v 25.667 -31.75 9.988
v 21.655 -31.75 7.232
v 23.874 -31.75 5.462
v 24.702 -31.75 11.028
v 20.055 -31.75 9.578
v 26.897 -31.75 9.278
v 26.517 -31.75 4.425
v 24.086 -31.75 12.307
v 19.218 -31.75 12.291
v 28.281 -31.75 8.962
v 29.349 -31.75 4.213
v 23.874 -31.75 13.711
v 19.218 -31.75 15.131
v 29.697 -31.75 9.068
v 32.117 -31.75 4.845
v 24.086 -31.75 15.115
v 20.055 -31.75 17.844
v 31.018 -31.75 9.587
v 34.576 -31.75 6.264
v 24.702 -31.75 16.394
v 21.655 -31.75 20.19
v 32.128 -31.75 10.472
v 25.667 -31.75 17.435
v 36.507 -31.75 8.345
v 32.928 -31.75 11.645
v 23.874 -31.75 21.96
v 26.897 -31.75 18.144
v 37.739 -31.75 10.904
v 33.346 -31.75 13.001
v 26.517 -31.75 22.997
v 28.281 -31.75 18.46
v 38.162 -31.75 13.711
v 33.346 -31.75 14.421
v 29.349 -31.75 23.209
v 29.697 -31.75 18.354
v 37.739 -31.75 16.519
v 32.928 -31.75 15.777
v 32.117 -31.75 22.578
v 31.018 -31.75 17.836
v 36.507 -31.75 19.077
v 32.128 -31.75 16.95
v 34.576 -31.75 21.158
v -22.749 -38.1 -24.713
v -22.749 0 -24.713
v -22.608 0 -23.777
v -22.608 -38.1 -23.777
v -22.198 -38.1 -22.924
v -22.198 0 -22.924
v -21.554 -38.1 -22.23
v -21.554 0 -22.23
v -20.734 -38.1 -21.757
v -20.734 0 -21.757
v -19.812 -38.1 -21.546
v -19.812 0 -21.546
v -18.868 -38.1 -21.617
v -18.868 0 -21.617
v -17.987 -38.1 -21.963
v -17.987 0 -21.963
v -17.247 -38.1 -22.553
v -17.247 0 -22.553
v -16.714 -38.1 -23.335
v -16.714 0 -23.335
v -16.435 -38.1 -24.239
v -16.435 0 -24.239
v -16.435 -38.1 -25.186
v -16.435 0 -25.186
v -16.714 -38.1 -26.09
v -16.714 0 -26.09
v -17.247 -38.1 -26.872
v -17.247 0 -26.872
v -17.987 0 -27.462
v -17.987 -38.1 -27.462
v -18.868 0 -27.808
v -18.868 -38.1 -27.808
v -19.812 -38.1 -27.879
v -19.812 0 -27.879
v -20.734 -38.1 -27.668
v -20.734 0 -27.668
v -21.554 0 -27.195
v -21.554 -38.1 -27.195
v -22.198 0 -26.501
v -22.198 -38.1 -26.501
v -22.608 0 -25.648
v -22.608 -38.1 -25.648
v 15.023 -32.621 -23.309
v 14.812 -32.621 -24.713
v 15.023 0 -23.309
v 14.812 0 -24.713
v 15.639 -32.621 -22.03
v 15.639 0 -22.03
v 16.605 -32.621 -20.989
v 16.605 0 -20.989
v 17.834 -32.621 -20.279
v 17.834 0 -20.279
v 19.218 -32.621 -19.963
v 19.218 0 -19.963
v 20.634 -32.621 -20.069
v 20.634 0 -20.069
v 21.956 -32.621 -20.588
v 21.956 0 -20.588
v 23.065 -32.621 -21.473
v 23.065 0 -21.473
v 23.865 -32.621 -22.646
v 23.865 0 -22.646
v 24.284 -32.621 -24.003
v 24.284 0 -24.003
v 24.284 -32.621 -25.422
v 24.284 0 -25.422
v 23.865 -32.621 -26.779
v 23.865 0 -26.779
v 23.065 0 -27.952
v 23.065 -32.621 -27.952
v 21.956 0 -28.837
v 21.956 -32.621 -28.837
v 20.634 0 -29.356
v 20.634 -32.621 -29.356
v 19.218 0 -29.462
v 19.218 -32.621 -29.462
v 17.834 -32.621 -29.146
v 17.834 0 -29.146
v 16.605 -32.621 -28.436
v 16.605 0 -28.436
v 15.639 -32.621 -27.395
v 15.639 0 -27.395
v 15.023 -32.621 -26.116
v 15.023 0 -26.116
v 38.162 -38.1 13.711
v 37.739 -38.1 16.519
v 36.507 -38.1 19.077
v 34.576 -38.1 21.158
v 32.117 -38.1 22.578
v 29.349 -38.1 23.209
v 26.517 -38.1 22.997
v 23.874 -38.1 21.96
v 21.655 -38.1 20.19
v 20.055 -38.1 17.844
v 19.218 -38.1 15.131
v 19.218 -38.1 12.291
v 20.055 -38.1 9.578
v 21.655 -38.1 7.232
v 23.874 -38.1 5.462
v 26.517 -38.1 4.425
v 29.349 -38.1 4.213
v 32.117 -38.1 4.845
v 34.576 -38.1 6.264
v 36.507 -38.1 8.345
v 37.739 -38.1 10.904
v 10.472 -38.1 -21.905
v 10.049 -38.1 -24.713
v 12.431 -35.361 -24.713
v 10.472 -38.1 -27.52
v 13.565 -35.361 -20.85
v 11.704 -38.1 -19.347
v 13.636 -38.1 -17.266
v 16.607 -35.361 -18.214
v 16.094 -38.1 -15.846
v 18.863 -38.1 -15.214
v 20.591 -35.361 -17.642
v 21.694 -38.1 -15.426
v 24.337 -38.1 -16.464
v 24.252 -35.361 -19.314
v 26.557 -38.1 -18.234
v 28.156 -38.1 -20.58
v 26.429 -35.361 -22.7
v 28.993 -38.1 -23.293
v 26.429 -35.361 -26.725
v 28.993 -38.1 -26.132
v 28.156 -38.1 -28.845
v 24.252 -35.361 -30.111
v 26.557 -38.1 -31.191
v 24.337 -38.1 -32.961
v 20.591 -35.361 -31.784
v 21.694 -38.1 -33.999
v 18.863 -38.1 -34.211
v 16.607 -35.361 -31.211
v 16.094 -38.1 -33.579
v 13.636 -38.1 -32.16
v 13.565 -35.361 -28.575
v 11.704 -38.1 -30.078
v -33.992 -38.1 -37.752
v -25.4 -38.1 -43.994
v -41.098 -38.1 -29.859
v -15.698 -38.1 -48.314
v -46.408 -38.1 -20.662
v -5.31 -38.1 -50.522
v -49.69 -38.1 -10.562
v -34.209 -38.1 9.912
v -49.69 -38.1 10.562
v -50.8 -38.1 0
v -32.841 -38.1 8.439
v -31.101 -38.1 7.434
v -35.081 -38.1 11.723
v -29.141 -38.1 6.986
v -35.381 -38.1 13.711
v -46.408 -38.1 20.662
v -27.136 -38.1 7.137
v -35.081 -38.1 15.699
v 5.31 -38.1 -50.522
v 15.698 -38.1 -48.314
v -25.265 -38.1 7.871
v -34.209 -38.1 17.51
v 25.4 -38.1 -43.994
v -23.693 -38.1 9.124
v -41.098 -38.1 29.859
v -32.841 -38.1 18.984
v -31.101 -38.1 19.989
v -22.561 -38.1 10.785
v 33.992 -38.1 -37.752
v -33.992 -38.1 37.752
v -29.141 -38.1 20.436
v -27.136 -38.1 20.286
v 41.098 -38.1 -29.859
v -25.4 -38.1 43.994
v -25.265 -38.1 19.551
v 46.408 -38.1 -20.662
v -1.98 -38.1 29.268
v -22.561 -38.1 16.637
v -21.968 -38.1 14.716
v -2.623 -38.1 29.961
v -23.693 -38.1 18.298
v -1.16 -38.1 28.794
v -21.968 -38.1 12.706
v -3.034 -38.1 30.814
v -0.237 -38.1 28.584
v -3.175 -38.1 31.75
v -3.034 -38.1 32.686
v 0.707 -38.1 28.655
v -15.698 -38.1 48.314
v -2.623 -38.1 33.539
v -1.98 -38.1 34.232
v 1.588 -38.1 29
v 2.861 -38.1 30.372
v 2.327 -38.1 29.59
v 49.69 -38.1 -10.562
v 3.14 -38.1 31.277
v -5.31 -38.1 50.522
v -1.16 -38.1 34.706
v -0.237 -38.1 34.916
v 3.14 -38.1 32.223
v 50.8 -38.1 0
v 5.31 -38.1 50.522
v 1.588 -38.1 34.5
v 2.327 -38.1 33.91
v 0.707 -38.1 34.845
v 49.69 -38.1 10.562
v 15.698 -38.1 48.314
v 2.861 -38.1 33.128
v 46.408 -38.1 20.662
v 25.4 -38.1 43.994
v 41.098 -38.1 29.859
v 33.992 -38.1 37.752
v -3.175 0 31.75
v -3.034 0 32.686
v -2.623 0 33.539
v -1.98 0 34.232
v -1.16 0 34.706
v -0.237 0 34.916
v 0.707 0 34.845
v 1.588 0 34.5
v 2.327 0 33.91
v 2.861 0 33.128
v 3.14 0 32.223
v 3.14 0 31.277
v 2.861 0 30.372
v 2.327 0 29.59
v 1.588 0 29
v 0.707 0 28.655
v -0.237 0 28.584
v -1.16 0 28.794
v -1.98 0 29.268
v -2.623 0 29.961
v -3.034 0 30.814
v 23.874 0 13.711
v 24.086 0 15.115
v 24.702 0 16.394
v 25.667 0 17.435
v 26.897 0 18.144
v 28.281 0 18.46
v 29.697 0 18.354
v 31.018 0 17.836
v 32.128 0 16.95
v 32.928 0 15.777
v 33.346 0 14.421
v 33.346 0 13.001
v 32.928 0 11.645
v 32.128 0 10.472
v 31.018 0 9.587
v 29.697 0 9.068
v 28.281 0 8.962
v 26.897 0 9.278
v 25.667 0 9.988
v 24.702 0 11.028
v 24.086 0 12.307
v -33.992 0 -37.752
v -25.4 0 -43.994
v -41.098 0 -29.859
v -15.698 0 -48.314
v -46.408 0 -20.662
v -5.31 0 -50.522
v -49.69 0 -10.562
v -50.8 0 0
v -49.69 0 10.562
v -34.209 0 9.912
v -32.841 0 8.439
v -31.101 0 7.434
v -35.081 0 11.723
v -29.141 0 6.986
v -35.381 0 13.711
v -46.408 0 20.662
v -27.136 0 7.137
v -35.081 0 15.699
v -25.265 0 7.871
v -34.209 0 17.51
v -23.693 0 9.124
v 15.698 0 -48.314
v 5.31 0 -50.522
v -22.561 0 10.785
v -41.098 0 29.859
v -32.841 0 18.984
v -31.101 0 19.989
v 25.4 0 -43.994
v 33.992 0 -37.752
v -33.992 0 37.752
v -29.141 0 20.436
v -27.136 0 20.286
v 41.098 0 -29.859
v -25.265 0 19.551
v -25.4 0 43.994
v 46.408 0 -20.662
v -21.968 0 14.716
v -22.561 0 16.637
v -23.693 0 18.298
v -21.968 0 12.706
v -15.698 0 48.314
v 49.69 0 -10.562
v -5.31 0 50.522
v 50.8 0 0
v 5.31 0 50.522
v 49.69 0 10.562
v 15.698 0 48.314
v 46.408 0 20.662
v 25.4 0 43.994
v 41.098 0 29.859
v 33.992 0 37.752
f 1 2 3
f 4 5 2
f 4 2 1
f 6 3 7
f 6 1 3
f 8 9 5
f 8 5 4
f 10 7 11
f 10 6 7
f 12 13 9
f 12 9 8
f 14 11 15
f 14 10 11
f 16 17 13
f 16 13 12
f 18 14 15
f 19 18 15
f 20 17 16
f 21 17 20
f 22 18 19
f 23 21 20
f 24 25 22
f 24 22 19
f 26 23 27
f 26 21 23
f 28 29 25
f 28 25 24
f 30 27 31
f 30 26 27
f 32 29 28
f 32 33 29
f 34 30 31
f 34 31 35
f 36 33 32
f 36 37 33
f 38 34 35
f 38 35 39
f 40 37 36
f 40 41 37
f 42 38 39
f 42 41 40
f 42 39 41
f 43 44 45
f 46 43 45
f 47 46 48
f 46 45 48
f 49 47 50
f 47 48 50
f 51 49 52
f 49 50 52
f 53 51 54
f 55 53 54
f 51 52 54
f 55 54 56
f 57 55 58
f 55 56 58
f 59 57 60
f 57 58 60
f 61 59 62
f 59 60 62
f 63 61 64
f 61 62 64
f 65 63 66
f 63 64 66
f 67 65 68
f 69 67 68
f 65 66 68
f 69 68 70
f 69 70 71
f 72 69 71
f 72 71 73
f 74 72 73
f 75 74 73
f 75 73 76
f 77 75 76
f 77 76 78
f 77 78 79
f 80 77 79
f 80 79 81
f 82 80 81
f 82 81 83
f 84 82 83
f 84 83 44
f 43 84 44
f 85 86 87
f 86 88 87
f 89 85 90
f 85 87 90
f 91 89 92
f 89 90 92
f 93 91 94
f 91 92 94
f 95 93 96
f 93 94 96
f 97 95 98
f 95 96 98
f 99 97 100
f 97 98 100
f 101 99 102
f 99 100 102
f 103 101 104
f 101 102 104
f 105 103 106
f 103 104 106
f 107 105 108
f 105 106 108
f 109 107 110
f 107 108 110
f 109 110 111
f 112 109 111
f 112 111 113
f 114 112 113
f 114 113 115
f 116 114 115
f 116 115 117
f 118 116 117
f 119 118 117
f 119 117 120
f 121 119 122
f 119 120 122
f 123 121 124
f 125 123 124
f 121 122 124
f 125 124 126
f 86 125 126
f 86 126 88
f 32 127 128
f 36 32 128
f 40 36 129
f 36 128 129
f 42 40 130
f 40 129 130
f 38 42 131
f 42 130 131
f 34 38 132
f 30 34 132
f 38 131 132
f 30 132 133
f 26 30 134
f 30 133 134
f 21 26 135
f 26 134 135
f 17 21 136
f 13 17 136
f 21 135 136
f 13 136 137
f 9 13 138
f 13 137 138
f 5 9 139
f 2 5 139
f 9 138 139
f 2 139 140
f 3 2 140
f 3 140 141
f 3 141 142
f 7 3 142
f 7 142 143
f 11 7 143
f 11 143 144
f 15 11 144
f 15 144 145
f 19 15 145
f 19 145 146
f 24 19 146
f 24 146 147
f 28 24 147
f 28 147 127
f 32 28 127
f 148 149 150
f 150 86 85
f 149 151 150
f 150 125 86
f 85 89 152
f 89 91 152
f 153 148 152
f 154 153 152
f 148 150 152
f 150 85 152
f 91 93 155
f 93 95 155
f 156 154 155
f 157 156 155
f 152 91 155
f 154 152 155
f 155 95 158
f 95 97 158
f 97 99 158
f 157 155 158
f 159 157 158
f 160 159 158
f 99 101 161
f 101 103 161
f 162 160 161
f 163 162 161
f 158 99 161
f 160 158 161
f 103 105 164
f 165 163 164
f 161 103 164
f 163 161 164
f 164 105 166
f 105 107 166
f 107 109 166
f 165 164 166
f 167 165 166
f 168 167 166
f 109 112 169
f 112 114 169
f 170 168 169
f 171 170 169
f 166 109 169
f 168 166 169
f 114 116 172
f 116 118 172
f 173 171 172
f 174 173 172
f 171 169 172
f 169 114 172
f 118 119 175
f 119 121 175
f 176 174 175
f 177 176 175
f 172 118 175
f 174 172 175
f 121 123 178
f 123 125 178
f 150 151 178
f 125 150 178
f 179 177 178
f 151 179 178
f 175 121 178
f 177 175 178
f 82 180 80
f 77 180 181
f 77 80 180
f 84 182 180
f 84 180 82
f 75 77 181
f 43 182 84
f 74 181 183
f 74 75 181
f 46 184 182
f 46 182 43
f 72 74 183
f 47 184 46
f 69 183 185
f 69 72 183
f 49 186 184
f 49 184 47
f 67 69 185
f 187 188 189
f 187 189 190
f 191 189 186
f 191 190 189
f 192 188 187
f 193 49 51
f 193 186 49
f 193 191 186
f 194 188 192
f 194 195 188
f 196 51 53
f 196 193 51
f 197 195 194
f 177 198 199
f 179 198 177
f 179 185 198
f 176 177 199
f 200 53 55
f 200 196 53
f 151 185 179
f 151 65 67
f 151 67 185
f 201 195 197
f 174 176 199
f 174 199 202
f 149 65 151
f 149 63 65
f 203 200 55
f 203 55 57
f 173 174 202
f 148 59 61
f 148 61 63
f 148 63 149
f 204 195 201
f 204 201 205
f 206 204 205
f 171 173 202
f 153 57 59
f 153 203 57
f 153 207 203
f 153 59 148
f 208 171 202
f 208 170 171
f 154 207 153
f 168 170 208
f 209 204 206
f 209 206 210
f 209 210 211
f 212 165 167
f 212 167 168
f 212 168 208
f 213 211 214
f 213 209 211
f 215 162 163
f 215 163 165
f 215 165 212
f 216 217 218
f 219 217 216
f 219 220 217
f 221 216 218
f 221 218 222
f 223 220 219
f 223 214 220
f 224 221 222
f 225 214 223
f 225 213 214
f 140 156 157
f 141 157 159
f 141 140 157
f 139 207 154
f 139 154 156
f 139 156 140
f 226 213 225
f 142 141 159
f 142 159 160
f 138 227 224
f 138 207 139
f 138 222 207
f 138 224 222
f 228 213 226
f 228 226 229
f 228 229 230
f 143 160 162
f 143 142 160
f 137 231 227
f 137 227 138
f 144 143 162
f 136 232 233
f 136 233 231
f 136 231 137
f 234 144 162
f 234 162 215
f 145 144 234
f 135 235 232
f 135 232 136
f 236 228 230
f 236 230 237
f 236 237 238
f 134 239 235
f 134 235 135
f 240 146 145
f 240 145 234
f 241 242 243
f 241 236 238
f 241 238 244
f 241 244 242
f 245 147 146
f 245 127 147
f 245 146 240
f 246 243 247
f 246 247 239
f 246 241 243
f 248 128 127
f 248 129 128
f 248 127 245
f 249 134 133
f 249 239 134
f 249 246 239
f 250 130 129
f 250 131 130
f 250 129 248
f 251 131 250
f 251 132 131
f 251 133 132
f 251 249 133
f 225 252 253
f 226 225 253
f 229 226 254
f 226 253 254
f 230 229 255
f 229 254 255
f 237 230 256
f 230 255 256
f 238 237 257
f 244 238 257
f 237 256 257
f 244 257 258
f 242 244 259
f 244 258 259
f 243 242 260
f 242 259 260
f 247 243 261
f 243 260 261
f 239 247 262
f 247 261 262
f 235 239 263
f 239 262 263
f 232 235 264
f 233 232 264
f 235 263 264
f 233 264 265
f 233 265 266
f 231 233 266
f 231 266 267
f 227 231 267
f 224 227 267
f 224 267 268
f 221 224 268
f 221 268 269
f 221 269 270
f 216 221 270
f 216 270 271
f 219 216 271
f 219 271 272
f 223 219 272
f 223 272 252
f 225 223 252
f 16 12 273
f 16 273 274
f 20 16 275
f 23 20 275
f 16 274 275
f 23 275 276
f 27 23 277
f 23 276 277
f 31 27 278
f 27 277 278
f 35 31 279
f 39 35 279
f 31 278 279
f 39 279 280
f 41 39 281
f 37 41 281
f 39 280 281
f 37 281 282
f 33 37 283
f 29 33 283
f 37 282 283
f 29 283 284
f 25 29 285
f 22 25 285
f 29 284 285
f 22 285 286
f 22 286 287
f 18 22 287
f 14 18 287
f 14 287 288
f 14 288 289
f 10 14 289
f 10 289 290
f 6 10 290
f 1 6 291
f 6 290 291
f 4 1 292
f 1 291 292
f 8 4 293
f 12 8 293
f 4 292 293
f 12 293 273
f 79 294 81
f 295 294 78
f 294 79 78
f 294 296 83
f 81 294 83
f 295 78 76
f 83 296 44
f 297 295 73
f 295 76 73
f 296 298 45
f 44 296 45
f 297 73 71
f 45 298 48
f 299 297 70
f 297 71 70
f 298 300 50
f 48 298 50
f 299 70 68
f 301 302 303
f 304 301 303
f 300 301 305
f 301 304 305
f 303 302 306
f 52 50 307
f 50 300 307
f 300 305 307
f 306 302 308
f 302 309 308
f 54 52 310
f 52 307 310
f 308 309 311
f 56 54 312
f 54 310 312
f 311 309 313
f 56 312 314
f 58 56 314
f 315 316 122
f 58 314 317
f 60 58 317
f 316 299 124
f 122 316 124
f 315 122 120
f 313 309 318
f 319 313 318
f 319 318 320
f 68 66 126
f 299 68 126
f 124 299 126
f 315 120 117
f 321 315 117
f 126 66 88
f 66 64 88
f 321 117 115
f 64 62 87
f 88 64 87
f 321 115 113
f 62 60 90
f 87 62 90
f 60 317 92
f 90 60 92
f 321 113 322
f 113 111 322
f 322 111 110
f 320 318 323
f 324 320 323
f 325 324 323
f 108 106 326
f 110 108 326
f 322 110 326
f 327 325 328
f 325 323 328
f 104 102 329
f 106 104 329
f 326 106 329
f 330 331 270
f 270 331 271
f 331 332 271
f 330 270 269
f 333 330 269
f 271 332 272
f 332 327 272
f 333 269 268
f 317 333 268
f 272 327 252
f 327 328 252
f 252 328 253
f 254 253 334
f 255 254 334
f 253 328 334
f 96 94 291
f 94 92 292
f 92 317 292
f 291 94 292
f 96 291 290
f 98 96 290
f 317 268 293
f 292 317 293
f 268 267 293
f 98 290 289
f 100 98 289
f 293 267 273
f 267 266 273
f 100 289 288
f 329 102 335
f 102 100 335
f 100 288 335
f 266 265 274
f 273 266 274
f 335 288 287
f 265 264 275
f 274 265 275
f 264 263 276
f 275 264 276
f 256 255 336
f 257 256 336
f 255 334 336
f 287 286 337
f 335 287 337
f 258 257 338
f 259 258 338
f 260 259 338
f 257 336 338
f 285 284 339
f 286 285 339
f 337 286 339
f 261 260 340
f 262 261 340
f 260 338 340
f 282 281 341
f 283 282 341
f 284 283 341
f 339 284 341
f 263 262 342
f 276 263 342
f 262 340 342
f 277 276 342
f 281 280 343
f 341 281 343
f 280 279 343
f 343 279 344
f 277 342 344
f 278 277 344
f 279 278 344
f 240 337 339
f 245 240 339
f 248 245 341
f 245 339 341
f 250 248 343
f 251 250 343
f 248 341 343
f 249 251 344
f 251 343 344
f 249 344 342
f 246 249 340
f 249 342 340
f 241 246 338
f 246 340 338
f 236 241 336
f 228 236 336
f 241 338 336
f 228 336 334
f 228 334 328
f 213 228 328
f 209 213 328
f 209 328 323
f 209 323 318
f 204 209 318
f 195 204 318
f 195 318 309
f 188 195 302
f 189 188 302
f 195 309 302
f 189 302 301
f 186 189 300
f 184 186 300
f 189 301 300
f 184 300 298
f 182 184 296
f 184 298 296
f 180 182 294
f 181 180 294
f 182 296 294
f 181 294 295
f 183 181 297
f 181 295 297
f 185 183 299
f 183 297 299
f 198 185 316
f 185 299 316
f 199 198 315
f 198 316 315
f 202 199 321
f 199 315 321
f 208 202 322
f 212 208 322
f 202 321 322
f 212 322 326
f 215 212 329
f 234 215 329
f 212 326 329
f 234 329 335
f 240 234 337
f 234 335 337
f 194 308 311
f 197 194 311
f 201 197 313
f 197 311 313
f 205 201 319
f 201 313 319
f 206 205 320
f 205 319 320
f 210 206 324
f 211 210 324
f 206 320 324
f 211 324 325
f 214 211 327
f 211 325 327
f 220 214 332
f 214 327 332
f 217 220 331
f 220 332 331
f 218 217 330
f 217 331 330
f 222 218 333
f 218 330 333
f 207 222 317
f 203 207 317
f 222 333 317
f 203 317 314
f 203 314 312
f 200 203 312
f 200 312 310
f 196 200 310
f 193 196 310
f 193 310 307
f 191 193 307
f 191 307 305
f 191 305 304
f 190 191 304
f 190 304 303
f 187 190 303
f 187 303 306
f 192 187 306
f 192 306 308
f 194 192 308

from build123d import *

# Parameters (mm, degrees)
F0_R           = 50.8
F1_DEPTH       = 38.1
F3_D           = 6.35
F4_D           = 9.525
F4_CBORE_D     = 19.05
F4_CBORE_DEPTH = 6.35
F5_D           = 9.525
F5_CSINK_D     = 19.05
F5_CSINK_ANGLE = 82
F6_D           = 6.35
F7_D           = 13.4874


with BuildPart() as f1:
    # F0 (on Front) → F1 (new body)
    with BuildSketch(Plane.XZ):
        Circle(F0_R)
        with BuildLine():
            ThreePointArc((0, 31.75), (22.45064, 22.45064), (31.75, 0))
            ThreePointArc((31.75, 0), (-22.45064, -22.45064), (0, 31.75))
        make_face(mode=Mode.SUBTRACT)
        with BuildLine():
            ThreePointArc((0, 31.75), (-22.45064, -22.45064), (31.75, 0))
            ThreePointArc((31.75, 0), (22.45064, 22.45064), (0, 31.75))
        make_face()
    extrude(amount=F1_DEPTH)

    # F3 (through all)
    with Locations(Plane.XZ.offset(38.1)):
        with Locations((0, 31.75)):
            Hole(F3_D / 2)

    # F4 (through all)
    with Locations(Plane.XZ.offset(38.1)):
        with Locations((28.636823, 13.711123)):
            CounterBoreHole(F4_D / 2, F4_CBORE_D / 2, F4_CBORE_DEPTH)

    # F5 (through all)
    with Locations(Plane.XZ.offset(38.1)):
        with Locations((19.574312, -24.712568)):
            CounterSinkHole(F5_D / 2, F5_CSINK_D / 2, counter_sink_angle=F5_CSINK_ANGLE)

    # F6 (through all)
    with Locations(Plane.XZ.offset(38.1)):
        with Locations((-19.574312, -24.712568)):
            Hole(F6_D / 2)

    # F7 (through all)
    with Locations(Plane.XZ.offset(38.1)):
        with Locations((-28.636823, 13.711123)):
            Hole(F7_D / 2)


solid = f1.part
